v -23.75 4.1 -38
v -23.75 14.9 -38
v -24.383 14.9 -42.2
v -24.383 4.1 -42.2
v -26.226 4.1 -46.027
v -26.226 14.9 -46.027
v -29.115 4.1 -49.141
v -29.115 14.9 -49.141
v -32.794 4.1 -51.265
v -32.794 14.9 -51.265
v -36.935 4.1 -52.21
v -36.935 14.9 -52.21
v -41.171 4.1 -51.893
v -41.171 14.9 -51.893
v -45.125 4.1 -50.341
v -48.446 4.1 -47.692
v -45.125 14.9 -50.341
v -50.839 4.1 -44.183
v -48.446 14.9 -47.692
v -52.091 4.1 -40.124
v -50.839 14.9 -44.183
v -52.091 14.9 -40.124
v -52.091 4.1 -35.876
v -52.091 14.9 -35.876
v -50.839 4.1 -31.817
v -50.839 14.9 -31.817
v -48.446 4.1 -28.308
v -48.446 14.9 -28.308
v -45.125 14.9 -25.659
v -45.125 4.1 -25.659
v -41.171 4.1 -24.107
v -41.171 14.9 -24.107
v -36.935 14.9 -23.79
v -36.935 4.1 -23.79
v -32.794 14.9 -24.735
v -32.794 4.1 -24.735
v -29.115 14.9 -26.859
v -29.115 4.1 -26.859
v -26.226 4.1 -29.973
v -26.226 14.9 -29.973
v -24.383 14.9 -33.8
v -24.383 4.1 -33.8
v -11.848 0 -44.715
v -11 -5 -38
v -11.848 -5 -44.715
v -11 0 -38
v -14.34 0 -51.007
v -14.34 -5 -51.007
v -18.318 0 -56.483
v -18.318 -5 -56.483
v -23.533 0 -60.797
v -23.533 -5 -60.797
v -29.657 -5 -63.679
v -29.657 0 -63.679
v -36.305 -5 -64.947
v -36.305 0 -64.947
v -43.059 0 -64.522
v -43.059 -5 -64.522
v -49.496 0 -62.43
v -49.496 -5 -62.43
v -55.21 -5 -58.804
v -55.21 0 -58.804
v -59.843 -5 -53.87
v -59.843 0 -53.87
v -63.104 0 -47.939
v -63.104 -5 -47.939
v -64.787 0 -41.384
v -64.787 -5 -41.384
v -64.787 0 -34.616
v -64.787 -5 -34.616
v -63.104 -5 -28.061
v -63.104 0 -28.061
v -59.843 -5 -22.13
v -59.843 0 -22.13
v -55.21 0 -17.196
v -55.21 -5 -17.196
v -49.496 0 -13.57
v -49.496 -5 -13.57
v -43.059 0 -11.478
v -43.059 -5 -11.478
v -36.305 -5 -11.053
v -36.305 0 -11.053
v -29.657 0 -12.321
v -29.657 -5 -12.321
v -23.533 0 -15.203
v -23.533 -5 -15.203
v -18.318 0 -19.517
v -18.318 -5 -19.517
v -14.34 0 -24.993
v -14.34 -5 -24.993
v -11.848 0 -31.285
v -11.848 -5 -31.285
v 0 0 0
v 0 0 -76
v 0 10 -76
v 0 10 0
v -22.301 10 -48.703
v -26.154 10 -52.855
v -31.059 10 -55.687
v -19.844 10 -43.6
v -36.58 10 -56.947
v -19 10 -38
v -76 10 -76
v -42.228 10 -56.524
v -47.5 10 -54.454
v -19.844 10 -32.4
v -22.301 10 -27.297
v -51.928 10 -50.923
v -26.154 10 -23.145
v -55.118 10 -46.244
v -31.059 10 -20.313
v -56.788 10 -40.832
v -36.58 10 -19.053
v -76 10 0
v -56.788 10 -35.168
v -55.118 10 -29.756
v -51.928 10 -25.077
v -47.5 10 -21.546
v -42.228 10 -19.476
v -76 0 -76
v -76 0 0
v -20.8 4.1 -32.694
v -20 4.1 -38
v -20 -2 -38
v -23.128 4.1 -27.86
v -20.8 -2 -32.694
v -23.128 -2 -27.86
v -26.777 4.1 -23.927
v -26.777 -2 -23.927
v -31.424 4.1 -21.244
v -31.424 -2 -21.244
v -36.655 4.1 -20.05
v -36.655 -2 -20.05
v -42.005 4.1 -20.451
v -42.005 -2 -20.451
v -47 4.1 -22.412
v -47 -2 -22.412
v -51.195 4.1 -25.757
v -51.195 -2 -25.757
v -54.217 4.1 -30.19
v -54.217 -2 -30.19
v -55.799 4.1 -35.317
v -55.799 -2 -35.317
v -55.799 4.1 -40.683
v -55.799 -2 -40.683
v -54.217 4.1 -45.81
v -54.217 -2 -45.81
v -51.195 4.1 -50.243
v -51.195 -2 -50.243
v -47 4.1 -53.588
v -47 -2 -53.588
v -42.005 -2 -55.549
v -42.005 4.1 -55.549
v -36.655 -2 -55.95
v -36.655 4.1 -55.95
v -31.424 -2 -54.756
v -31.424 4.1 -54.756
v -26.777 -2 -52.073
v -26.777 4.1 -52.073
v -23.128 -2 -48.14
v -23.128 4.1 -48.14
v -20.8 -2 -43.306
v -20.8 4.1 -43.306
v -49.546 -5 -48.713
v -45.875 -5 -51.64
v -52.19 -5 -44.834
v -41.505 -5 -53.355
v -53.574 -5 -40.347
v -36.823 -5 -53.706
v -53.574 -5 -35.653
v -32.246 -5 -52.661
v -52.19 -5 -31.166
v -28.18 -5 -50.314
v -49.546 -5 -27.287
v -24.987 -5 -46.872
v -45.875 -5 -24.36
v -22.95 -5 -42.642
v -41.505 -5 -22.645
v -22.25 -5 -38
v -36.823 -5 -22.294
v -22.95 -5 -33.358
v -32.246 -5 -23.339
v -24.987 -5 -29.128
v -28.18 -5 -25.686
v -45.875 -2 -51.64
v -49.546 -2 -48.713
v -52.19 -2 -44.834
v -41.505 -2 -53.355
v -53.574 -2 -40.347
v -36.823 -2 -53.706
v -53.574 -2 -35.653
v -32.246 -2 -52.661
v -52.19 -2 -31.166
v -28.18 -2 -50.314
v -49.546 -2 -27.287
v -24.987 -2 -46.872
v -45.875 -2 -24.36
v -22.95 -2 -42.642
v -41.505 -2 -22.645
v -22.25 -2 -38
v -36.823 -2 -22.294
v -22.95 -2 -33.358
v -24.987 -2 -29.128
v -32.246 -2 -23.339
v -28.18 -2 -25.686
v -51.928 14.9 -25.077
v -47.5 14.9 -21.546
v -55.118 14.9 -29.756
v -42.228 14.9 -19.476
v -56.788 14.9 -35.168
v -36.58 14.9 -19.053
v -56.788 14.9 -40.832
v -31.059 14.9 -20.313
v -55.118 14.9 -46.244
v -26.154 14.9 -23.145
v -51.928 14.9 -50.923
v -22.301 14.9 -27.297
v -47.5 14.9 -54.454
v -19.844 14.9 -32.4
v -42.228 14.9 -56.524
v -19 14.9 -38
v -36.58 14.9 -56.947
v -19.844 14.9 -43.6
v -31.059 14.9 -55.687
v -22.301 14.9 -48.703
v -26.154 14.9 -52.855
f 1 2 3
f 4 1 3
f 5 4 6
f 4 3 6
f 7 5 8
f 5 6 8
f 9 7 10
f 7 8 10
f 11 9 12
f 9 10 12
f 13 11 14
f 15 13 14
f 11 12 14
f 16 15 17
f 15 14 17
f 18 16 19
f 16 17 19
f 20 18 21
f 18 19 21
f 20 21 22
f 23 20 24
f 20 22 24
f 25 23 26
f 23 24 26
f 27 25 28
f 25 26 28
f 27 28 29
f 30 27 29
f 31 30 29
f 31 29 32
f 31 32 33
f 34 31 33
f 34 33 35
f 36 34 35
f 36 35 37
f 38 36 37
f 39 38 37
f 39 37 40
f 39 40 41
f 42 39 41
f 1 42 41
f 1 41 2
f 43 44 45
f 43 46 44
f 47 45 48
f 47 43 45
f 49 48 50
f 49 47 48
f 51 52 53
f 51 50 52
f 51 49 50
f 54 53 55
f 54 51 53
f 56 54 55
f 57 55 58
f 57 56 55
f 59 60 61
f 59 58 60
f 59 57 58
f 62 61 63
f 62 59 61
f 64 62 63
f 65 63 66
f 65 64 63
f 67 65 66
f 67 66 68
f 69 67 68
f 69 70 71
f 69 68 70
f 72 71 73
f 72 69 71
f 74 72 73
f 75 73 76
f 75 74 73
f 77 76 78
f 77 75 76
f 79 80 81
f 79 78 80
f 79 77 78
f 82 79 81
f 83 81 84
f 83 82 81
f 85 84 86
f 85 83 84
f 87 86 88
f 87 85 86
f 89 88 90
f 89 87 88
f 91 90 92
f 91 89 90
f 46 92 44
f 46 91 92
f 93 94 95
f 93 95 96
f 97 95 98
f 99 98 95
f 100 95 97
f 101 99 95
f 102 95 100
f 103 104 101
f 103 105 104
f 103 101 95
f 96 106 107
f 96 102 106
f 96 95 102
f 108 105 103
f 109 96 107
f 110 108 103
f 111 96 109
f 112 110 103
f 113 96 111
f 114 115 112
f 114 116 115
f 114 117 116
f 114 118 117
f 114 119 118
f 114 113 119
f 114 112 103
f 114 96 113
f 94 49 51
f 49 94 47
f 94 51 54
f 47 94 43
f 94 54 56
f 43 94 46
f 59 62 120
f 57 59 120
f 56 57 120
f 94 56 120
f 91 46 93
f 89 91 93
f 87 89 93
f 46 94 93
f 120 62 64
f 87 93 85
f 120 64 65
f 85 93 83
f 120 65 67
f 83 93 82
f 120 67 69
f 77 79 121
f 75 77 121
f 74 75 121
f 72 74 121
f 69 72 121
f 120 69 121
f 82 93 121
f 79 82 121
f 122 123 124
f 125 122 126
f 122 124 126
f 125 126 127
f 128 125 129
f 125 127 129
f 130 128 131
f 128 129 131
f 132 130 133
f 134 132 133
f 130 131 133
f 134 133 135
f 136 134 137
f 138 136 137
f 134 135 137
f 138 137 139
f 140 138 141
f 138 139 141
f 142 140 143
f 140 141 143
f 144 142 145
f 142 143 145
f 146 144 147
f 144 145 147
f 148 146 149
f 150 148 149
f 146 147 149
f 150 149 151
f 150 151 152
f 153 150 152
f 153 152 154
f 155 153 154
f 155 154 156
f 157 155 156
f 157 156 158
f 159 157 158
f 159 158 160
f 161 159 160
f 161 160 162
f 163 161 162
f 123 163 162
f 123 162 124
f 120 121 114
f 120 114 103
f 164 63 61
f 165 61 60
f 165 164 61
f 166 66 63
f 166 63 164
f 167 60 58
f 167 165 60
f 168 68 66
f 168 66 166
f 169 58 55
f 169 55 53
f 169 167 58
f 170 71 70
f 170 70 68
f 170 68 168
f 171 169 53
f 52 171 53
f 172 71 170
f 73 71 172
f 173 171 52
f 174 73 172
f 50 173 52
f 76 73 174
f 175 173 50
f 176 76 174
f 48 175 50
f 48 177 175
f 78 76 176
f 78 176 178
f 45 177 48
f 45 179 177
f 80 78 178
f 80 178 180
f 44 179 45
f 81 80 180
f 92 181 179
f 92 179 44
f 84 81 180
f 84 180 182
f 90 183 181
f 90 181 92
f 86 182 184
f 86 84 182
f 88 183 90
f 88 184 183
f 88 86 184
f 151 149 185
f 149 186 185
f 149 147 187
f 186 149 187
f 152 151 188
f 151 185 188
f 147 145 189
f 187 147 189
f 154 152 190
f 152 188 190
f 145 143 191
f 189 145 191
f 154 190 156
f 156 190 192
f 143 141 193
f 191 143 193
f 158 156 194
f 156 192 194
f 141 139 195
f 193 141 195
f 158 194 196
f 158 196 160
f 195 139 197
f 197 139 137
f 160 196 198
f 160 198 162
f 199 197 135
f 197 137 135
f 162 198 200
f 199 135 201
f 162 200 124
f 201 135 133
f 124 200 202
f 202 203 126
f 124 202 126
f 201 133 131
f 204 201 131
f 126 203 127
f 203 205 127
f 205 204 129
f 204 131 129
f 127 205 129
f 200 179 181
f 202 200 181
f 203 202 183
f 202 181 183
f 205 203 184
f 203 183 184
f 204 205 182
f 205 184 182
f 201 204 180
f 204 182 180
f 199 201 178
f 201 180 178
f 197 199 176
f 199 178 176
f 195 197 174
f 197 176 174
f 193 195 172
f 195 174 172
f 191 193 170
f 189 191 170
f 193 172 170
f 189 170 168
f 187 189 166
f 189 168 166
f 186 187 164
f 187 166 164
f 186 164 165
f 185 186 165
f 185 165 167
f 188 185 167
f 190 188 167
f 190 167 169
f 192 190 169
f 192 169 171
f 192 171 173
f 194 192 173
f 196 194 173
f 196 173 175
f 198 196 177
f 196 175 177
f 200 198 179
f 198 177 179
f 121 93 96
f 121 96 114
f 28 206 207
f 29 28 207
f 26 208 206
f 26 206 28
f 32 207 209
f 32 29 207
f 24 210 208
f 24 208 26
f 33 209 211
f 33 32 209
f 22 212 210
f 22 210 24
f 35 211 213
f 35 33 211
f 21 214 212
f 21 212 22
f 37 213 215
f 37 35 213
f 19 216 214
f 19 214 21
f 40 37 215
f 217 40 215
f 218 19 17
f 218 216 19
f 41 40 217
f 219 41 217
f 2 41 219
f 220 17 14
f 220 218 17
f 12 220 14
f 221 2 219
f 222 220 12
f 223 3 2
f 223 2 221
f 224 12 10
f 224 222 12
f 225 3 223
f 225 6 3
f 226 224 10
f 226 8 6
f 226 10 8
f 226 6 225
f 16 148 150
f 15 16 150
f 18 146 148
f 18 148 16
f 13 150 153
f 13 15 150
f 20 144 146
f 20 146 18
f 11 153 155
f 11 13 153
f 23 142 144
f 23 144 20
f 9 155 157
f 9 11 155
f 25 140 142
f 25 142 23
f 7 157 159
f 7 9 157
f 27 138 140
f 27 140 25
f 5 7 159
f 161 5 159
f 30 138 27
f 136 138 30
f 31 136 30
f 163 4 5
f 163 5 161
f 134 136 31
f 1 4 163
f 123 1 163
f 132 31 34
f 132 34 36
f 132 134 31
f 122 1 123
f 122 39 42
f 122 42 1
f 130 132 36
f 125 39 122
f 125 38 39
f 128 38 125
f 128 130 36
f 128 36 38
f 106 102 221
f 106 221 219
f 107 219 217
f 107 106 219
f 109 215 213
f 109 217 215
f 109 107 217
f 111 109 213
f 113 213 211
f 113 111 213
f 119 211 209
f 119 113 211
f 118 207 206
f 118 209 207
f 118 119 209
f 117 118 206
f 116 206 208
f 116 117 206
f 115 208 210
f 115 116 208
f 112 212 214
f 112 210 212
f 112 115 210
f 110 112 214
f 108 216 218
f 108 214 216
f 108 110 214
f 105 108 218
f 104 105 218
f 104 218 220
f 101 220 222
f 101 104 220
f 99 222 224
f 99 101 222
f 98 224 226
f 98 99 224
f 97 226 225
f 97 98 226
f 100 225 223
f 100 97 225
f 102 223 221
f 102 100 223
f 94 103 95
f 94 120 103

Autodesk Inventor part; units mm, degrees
ref_plane "YZ Plane" through (0, 0, 0) normal (1, 0, 0) x (0, 1, 0)
ref_plane "XZ Plane" through (0, 0, 0) normal (0, 1, 0) x (-1, 0, 0)
ref_plane "XY Plane" through (0, 0, 0) normal (0, 0, 1) x (1, 0, 0)
sketch "Sketch1" plane through (0, 0, 0) normal (0, 1, 0) x (-1, 0, 0)
  line L0 (0, 0) -> (76, 0)
  line L1 (76, 0) -> (76, -76)
  line L2 (76, -76) -> (0, -76)
  line L3 (0, -76) -> (0, 0)
  dimension "d0" = 76
  dimension "d1" = 76
extrude "Extrusion1" add sketch "Sketch1" along normal blind 10
sketch "Sketch2" plane through (0, 10, 0) normal (0, 1, 0) x (1, 0, 0)
  circle A0 centre (-38, 38) radius 19
  point P0 (0, 0)
  dimension "d4" = 38
extrude "Extrusion2" add sketch "Sketch2" along normal blind 4.9
sketch "Sketch8" plane through (0, 0, 0) normal (0, -1, 0) x (1, 0, 0)
  circle A0 centre (-38, -38) radius 27
  point P0 (0, 0)
  dimension "d18" = 54
extrude "Extrusion6" add sketch "Sketch8" along normal blind 5
sketch "Sketch9" plane through (-38, -5, -38) normal (0, -1, 0) x (1, 0, 0)
  circle A0 centre (0, 0) radius 15.75
  point P0 (38, 38)
  dimension "d21" = 31.5
extrude "Extrusion7" cut sketch "Sketch9" against normal blind 3
sketch "Sketch10" plane through (-38, -2, -38) normal (0, -1, 0) x (1, 0, 0)
  circle A0 centre (0, 0) radius 18
  point P0 (38, 38)
  dimension "d24" = 36
extrude "Extrusion8" cut sketch "Sketch10" against normal blind 6.1
sketch "Sketch11" plane through (-38, 14.9, -38) normal (0, 1, 0) x (1, 0, 0)
  circle A0 centre (0, 0) radius 15.75 projected
  circle A1 centre (0, 0) radius 14.25
  point P0 (38, -38)
  dimension "d27" = 28.5
extrude "Extrusion9" cut sketch "Sketch11" against normal blind 10.8 contours A1
